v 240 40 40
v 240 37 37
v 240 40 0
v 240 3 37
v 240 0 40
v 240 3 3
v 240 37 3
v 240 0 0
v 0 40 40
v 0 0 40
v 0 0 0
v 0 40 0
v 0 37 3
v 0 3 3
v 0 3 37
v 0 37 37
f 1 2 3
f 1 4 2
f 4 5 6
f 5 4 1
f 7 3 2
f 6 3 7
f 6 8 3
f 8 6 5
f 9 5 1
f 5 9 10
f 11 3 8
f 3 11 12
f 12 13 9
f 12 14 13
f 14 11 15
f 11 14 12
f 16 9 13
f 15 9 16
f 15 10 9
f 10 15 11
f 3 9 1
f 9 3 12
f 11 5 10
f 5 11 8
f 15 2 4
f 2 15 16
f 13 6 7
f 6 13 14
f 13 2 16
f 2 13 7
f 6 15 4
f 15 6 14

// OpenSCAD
$fn = 32;

// ----------------------------------------------------------------------
// Box beam: 200-250 mm hollow beam
// ----------------------------------------------------------------------

// --- parameters (mm) ---
beam_l = 240;             // beam length, X
beam_w = 40;              // beam width, Y
beam_h = 40;              // beam height, Z
wall = 3;                 // wall thickness
fit_tol = 0.1;            // tolerance for press fits, mm
free_tol = 0.5;           // tolerance for clearance fits, mm

difference() {
  cube([beam_l, beam_w, beam_h]);
  translate([-1, wall, wall])
    cube([beam_l + 2, beam_w - 2 * wall, beam_h - 2 * wall]);
}
